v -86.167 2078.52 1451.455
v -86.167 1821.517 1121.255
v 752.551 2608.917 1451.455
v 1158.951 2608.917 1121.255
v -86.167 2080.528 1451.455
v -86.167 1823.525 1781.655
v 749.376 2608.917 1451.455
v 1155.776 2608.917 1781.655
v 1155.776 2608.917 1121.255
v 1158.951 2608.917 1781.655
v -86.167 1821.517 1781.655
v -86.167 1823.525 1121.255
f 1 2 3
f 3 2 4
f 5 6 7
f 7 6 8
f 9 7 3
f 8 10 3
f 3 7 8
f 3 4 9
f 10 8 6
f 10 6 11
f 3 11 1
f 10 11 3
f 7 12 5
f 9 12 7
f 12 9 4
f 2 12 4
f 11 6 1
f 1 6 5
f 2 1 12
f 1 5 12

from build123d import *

# Parameters (mm, degrees)
SKETCH5_W          = 850.532199311
SKETCH5_H          = 887.458344
CUT_EXTRUDE5_DEPTH = 406.4


with BuildPart() as part:
    # Boss-Extrude1: read off the stored shape, not the designer's step
    # Boss-Extrude1: loft between two sections, ruled curve by curve
    boss_extrude1_from = [
        Edge.make_line((-86.167457674, 1821.517106037, 1121.25455637), (-492.567457674, 1821.517106037, 1451.45455637)),
        Edge.make_line((-492.567457674, 1821.517106037, 1451.45455637), (752.550801769, 2608.917106037, 1451.45455637)),
        Edge.make_line((752.550801769, 2608.917106037, 1451.45455637), (1158.950801769, 2608.917106037, 1121.25455637)),
        Edge.make_line((1158.950801769, 2608.917106037, 1121.25455637), (-86.167457674, 1821.517106037, 1121.25455637)),
    ]
    boss_extrude1_to = [
        Edge.make_line((-89.342457674, 1821.517106037, 1121.25455637), (-495.742457674, 1821.517106037, 1451.45455637)),
        Edge.make_line((-495.742457674, 1821.517106037, 1451.45455637), (749.375801769, 2608.917106037, 1451.45455637)),
        Edge.make_line((749.375801769, 2608.917106037, 1451.45455637), (1155.775801769, 2608.917106037, 1121.25455637)),
        Edge.make_line((1155.775801769, 2608.917106037, 1121.25455637), (-89.342457674, 1821.517106037, 1121.25455637)),
    ]
    boss_extrude1 = Solid(Shell([*[Face.make_surface_from_curves(boss_extrude1_from[k], boss_extrude1_to[k]) for k in range(4)], Face(Wire(boss_extrude1_from)), Face(Wire(boss_extrude1_to))]))
    add(boss_extrude1)

    # Mirror1: Boss-Extrude1 across plane
    add(boss_extrude1.mirror(Plane.XY.offset(1451.45455637)))

    # Sketch5 → Cut-Extrude5 (cut, symmetric)
    with BuildSketch(Plane(origin=(-492.567457674, 0, 0), x_dir=(0, 0, -1), z_dir=(1, 0, 0))):
        with Locations((-1421.298204875, 2221.371463485)):
            Rectangle(SKETCH5_W, SKETCH5_H)
    extrude(amount=CUT_EXTRUDE5_DEPTH, both=True, mode=Mode.SUBTRACT)


solid = part.part
